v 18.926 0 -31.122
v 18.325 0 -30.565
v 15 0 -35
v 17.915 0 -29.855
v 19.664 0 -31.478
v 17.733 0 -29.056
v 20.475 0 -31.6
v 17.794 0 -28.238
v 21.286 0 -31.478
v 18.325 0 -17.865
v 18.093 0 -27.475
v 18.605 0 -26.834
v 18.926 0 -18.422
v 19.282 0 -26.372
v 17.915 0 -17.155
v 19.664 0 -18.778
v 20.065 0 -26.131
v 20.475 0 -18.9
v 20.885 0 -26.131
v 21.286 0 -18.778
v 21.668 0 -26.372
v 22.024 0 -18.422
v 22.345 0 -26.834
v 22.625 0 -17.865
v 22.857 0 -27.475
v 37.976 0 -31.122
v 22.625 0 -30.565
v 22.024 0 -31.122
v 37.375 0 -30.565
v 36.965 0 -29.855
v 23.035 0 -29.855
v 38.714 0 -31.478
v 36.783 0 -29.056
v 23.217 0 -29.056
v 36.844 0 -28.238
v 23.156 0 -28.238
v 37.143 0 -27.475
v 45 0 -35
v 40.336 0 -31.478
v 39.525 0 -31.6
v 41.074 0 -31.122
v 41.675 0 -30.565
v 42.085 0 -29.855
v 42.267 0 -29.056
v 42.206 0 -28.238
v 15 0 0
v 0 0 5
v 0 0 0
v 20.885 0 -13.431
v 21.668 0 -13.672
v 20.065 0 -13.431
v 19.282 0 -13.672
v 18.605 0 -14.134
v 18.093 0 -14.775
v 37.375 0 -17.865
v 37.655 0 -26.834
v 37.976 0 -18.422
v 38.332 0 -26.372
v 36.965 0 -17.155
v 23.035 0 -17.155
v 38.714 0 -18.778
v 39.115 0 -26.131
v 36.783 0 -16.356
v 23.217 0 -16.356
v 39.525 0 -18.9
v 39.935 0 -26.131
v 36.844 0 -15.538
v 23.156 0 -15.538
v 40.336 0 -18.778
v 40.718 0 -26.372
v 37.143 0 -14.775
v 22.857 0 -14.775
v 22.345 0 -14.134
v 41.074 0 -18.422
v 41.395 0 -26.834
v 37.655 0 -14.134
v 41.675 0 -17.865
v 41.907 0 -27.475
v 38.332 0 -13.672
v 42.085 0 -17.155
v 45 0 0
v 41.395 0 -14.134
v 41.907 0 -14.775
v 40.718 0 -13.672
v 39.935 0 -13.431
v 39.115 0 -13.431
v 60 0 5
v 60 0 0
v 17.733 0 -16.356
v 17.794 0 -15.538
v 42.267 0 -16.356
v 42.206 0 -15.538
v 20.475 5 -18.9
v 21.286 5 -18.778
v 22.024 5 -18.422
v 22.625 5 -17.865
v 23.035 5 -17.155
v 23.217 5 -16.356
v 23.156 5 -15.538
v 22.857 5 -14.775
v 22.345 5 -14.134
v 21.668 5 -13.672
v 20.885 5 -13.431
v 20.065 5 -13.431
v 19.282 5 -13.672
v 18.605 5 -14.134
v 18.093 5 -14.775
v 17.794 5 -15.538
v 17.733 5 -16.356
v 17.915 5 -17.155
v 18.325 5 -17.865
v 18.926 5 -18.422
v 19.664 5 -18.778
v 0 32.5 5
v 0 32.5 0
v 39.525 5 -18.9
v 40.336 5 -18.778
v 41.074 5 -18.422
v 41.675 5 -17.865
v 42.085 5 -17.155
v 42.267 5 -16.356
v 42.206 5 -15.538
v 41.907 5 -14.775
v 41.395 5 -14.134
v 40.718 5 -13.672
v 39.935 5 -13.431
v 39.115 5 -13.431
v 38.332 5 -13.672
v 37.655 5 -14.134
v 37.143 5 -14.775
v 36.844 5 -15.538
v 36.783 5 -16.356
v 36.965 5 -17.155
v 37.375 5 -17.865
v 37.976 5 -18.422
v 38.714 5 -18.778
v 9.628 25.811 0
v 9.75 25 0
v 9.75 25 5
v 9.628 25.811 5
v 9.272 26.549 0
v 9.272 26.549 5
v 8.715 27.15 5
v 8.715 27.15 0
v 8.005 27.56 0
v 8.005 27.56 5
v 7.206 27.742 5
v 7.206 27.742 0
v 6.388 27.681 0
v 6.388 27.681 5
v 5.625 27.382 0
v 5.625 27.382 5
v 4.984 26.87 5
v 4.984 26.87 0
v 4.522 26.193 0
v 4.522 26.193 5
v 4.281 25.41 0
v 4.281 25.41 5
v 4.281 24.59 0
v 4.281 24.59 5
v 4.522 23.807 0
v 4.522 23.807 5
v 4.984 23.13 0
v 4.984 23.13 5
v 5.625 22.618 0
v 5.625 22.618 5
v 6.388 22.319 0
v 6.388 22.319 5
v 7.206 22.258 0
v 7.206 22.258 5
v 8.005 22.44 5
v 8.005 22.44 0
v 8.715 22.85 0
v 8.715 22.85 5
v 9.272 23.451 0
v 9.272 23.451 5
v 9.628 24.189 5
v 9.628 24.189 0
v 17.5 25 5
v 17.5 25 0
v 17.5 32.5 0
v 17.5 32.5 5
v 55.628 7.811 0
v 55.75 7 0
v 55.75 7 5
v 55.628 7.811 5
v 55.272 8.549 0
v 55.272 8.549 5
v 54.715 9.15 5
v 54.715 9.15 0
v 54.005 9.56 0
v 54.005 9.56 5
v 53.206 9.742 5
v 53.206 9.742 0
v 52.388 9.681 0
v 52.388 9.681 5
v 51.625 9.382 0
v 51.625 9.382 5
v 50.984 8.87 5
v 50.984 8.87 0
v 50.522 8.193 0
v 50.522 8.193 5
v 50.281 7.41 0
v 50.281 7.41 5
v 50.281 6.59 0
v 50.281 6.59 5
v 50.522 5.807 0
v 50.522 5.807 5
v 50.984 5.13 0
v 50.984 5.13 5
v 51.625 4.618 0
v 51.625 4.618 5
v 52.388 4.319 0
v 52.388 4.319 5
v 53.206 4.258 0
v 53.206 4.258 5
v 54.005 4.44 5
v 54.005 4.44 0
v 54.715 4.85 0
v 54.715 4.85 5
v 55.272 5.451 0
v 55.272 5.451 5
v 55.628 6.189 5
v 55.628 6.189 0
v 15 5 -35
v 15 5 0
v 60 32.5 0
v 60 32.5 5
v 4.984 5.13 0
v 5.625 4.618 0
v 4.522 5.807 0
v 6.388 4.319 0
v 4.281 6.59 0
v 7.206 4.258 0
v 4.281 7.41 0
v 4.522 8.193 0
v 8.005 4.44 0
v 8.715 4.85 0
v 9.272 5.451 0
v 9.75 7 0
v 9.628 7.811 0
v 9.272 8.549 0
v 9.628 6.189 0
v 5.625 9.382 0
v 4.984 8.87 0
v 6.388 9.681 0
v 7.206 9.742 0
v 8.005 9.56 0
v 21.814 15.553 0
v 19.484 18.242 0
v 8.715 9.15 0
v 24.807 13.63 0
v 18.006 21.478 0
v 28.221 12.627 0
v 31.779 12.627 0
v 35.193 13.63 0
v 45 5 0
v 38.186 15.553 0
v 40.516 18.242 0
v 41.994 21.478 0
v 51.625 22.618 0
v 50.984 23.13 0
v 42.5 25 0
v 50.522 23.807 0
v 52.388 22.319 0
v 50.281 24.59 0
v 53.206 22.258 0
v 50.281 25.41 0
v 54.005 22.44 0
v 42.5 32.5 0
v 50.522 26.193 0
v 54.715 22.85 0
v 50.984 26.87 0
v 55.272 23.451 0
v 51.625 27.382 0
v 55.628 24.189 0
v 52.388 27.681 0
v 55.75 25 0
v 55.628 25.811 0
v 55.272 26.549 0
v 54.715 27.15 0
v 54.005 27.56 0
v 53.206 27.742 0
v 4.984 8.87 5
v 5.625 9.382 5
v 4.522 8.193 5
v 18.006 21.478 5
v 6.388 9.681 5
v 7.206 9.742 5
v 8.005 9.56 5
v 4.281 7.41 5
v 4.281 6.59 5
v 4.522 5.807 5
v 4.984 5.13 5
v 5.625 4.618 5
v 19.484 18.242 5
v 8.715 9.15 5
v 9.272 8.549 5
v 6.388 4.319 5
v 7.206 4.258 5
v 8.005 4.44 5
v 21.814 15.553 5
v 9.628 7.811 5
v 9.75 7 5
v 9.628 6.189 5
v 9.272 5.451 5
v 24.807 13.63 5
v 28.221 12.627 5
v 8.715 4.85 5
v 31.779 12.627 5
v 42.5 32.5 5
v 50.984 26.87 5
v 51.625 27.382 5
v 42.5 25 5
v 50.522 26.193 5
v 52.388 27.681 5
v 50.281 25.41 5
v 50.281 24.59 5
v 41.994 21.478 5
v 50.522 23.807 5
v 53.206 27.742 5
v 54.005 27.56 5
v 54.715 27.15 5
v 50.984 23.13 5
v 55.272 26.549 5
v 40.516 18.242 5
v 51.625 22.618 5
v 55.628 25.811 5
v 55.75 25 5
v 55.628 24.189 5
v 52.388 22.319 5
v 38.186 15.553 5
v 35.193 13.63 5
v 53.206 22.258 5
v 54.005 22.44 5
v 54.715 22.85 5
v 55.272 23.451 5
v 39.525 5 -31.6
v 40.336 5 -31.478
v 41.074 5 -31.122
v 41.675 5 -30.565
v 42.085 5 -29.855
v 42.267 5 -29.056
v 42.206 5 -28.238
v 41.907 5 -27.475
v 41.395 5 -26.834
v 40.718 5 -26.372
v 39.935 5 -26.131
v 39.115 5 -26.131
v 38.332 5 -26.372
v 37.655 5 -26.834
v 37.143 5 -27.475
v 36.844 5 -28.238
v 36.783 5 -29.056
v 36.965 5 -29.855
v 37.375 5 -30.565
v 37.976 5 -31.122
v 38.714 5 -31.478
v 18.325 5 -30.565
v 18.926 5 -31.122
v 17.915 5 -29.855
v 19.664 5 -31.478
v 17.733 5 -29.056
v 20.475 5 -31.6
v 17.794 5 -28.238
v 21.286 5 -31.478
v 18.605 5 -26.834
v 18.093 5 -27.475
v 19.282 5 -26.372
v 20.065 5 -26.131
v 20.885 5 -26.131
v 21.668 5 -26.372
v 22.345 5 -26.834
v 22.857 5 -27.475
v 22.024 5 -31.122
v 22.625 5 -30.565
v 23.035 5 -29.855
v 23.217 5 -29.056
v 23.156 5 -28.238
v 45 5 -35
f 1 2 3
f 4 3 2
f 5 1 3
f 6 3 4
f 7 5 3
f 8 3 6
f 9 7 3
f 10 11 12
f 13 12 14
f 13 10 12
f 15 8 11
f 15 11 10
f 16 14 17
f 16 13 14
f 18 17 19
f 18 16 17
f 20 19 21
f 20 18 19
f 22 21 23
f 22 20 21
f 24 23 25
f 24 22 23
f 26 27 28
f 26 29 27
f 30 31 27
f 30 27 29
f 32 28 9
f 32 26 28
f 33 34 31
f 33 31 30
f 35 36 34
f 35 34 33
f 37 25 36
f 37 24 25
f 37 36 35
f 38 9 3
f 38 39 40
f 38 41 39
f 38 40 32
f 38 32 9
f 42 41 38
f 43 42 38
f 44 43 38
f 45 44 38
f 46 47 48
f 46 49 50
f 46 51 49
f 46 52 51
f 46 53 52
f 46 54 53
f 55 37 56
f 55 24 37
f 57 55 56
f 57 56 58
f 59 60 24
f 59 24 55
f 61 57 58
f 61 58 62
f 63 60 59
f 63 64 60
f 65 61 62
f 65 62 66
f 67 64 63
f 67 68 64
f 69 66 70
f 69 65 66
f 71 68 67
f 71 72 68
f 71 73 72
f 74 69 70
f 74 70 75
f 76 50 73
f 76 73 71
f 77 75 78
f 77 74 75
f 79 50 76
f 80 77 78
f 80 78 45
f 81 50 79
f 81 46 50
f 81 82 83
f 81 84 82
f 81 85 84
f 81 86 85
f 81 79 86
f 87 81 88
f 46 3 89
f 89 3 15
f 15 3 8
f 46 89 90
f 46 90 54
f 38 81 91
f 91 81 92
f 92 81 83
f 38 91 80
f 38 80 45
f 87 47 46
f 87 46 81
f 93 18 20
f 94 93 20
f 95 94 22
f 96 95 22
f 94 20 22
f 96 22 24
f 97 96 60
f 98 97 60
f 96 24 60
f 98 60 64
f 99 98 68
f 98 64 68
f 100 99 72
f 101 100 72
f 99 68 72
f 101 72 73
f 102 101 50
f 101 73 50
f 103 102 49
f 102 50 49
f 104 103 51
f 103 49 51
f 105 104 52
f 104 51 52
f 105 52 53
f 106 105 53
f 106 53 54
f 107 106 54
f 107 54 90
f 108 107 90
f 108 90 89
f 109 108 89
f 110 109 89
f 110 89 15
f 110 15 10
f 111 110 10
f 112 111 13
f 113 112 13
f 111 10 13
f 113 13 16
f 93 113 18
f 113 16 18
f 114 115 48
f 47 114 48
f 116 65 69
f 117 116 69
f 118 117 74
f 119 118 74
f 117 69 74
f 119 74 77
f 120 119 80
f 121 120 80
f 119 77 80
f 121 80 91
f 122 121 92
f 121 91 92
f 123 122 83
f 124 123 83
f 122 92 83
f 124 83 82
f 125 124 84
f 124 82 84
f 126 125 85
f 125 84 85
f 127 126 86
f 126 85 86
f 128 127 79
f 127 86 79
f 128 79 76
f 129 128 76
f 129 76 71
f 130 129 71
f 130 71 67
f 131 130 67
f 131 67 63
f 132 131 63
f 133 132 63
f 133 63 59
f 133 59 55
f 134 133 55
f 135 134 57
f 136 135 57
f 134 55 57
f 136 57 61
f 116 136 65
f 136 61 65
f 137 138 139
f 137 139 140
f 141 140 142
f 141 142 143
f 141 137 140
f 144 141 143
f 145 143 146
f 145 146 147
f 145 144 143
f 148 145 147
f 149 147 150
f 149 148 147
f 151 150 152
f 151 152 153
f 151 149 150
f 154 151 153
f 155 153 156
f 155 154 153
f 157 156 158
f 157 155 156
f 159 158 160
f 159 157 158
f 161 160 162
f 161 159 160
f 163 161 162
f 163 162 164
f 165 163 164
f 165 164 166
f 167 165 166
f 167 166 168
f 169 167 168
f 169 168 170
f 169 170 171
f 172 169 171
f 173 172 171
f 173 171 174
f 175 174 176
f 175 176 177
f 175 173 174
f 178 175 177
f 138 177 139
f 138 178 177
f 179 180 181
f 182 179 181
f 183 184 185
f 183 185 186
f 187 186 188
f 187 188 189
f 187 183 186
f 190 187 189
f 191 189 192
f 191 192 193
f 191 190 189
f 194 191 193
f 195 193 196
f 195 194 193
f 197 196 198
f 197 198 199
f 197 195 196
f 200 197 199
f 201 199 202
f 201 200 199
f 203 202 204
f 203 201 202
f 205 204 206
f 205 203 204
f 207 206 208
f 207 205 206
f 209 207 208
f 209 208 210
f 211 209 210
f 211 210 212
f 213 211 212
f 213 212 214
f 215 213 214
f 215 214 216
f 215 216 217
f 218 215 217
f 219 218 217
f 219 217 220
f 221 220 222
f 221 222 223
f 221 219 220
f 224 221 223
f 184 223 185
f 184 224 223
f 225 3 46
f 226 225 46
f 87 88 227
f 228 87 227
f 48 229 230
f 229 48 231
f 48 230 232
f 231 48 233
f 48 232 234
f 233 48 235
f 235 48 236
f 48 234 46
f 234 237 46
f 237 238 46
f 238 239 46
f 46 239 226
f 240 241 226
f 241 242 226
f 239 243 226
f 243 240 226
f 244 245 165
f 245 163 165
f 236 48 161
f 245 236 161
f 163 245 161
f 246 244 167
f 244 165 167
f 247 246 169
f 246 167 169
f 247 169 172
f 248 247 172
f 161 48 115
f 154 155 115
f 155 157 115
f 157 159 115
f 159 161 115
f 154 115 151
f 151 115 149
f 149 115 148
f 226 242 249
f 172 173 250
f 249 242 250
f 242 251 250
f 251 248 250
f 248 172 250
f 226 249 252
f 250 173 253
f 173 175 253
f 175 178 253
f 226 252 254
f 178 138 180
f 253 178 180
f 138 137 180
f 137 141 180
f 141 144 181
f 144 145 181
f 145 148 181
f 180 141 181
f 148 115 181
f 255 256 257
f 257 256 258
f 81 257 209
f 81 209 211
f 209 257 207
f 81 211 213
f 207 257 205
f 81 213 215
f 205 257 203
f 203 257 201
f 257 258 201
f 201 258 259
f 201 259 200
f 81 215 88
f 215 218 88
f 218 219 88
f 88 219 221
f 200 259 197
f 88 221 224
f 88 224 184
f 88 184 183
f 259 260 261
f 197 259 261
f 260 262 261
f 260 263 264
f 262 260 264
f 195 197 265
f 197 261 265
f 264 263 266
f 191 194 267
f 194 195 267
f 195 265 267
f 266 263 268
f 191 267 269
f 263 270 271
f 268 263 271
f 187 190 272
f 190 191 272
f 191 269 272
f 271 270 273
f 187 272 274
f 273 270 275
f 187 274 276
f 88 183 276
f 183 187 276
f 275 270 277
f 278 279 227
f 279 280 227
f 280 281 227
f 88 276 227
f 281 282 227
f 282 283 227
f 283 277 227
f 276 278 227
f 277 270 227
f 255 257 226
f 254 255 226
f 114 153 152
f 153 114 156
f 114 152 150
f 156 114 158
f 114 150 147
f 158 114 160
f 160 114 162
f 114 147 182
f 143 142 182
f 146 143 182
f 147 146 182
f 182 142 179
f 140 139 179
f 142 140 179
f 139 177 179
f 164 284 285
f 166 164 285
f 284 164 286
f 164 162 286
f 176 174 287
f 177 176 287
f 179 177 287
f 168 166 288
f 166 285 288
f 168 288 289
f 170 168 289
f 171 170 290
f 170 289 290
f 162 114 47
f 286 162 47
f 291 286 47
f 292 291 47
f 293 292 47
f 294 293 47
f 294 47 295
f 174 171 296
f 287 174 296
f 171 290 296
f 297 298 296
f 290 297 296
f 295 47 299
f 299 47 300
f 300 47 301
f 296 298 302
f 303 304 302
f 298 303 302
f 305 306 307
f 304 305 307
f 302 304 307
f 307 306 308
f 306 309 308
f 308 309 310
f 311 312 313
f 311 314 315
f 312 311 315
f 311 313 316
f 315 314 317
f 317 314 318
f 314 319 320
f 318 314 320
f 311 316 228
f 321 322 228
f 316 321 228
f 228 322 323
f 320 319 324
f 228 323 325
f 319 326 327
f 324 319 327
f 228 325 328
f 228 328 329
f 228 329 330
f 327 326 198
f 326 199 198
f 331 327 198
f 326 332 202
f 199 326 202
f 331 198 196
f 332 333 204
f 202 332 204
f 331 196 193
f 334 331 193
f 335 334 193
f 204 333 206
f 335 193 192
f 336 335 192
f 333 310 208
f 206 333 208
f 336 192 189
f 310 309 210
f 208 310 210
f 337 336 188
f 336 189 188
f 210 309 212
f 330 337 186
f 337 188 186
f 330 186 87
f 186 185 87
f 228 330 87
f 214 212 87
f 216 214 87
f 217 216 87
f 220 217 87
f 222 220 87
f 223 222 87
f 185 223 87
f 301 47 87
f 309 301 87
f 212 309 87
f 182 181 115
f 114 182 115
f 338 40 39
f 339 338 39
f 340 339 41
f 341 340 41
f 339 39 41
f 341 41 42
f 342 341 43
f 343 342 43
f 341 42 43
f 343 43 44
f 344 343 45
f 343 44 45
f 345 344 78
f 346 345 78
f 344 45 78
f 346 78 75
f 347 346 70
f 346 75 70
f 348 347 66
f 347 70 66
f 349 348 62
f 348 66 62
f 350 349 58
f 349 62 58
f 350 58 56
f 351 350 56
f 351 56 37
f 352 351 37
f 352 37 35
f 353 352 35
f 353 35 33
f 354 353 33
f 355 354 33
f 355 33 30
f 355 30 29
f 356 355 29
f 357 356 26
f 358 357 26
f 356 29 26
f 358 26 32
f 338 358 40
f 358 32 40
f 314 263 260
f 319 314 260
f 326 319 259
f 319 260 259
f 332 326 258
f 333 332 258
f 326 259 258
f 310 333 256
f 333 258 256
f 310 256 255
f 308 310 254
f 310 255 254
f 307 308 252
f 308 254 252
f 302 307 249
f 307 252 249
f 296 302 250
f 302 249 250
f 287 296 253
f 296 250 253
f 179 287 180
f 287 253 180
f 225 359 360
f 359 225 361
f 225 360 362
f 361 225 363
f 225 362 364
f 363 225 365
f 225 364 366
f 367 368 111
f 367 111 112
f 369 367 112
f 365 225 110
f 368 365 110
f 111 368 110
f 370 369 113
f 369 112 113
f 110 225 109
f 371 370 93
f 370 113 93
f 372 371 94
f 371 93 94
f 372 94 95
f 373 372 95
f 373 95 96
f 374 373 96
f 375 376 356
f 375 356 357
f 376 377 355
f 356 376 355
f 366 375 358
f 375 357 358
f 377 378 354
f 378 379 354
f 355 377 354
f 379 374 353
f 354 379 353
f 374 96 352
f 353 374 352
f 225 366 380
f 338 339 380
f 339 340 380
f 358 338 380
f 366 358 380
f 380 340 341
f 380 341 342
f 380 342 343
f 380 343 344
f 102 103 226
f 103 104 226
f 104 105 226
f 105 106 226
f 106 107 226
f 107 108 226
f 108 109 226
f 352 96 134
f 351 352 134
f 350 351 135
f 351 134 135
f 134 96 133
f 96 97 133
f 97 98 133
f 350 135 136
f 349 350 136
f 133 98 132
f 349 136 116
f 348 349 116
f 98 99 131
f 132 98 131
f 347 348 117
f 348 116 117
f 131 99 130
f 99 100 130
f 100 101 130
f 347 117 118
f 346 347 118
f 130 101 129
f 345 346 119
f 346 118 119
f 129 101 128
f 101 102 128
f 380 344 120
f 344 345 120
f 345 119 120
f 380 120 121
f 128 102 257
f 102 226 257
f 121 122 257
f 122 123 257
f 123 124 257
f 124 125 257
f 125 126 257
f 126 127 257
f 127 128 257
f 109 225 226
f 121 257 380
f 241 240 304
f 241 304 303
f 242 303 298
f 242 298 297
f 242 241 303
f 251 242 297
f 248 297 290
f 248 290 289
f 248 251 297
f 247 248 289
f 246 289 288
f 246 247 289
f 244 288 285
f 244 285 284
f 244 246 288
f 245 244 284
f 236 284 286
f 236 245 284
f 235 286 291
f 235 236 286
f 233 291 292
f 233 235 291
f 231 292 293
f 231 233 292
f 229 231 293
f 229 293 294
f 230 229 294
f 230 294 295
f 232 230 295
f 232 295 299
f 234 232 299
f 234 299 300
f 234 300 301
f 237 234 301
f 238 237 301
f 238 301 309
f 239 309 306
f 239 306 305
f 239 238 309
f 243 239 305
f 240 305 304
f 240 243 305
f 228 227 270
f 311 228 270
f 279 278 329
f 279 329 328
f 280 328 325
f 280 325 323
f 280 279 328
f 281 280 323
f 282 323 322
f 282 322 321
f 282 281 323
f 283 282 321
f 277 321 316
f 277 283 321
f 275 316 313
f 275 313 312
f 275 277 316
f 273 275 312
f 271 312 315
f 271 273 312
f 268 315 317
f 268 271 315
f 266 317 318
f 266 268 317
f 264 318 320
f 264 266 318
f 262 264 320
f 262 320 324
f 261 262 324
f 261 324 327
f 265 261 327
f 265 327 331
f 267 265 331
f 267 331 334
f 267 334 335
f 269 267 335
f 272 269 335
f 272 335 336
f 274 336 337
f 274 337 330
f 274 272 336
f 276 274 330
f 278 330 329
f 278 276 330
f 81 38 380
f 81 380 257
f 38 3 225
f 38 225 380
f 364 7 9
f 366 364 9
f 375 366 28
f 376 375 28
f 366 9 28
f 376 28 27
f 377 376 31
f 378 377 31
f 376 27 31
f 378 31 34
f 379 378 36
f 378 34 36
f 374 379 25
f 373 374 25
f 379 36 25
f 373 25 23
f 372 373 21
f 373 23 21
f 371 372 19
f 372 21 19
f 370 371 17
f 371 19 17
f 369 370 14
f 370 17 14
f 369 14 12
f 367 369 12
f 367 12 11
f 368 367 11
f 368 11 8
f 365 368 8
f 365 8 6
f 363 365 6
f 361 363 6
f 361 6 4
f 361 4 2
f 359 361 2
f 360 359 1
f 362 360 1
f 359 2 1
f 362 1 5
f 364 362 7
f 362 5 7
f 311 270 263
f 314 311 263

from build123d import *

# Parameters (mm, degrees)
SKETCH1_R           = 2.75
BOSS_EXTRUDE1_DEPTH = 5
SKETCH2_W           = 30
SKETCH2_H           = 40
SKETCH2_R           = 2.75
BOSS_EXTRUDE2_DEPTH = 5


with BuildPart() as part:
    # Sketch1 → Boss-Extrude1 (new body)
    with BuildSketch(Plane.XY):
        with BuildLine():
            Line((0, 32.5), (0, 0))
            Line((0, 0), (60, 0))
            Line((60, 0), (60, 32.5))
            Line((60, 32.5), (42.5, 32.5))
            Line((42.5, 32.5), (42.5, 25))
            ThreePointArc((42.5, 25), (30, 12.5), (17.5, 25))
            Line((17.5, 25), (17.5, 32.5))
            Line((17.5, 32.5), (0, 32.5))
        make_face()
        with Locations((7, 7)):
            Circle(SKETCH1_R, mode=Mode.SUBTRACT)
        with Locations((53, 7)):
            Circle(SKETCH1_R, mode=Mode.SUBTRACT)
        with Locations((7, 25)):
            Circle(SKETCH1_R, mode=Mode.SUBTRACT)
        with Locations((53, 25)):
            Circle(SKETCH1_R, mode=Mode.SUBTRACT)
    extrude(amount=BOSS_EXTRUDE1_DEPTH)

    # Sketch2 → Boss-Extrude2 (add)
    with BuildSketch(Plane.XZ):
        with Locations((30, -15)):
            Rectangle(SKETCH2_W, SKETCH2_H)
        with Locations(Location((20.475, -16.15, 0), (0, 0, 270))):
            Circle(SKETCH2_R, mode=Mode.SUBTRACT)
        with Locations(Location((39.525, -16.15, 0), (0, 0, 270))):
            Circle(SKETCH2_R, mode=Mode.SUBTRACT)
        with Locations(Location((39.525, -28.85, 0), (0, 0, 270))):
            Circle(SKETCH2_R, mode=Mode.SUBTRACT)
        with Locations(Location((20.475, -28.85, 0), (0, 0, 270))):
            Circle(SKETCH2_R, mode=Mode.SUBTRACT)
    extrude(amount=-BOSS_EXTRUDE2_DEPTH)


solid = part.part
